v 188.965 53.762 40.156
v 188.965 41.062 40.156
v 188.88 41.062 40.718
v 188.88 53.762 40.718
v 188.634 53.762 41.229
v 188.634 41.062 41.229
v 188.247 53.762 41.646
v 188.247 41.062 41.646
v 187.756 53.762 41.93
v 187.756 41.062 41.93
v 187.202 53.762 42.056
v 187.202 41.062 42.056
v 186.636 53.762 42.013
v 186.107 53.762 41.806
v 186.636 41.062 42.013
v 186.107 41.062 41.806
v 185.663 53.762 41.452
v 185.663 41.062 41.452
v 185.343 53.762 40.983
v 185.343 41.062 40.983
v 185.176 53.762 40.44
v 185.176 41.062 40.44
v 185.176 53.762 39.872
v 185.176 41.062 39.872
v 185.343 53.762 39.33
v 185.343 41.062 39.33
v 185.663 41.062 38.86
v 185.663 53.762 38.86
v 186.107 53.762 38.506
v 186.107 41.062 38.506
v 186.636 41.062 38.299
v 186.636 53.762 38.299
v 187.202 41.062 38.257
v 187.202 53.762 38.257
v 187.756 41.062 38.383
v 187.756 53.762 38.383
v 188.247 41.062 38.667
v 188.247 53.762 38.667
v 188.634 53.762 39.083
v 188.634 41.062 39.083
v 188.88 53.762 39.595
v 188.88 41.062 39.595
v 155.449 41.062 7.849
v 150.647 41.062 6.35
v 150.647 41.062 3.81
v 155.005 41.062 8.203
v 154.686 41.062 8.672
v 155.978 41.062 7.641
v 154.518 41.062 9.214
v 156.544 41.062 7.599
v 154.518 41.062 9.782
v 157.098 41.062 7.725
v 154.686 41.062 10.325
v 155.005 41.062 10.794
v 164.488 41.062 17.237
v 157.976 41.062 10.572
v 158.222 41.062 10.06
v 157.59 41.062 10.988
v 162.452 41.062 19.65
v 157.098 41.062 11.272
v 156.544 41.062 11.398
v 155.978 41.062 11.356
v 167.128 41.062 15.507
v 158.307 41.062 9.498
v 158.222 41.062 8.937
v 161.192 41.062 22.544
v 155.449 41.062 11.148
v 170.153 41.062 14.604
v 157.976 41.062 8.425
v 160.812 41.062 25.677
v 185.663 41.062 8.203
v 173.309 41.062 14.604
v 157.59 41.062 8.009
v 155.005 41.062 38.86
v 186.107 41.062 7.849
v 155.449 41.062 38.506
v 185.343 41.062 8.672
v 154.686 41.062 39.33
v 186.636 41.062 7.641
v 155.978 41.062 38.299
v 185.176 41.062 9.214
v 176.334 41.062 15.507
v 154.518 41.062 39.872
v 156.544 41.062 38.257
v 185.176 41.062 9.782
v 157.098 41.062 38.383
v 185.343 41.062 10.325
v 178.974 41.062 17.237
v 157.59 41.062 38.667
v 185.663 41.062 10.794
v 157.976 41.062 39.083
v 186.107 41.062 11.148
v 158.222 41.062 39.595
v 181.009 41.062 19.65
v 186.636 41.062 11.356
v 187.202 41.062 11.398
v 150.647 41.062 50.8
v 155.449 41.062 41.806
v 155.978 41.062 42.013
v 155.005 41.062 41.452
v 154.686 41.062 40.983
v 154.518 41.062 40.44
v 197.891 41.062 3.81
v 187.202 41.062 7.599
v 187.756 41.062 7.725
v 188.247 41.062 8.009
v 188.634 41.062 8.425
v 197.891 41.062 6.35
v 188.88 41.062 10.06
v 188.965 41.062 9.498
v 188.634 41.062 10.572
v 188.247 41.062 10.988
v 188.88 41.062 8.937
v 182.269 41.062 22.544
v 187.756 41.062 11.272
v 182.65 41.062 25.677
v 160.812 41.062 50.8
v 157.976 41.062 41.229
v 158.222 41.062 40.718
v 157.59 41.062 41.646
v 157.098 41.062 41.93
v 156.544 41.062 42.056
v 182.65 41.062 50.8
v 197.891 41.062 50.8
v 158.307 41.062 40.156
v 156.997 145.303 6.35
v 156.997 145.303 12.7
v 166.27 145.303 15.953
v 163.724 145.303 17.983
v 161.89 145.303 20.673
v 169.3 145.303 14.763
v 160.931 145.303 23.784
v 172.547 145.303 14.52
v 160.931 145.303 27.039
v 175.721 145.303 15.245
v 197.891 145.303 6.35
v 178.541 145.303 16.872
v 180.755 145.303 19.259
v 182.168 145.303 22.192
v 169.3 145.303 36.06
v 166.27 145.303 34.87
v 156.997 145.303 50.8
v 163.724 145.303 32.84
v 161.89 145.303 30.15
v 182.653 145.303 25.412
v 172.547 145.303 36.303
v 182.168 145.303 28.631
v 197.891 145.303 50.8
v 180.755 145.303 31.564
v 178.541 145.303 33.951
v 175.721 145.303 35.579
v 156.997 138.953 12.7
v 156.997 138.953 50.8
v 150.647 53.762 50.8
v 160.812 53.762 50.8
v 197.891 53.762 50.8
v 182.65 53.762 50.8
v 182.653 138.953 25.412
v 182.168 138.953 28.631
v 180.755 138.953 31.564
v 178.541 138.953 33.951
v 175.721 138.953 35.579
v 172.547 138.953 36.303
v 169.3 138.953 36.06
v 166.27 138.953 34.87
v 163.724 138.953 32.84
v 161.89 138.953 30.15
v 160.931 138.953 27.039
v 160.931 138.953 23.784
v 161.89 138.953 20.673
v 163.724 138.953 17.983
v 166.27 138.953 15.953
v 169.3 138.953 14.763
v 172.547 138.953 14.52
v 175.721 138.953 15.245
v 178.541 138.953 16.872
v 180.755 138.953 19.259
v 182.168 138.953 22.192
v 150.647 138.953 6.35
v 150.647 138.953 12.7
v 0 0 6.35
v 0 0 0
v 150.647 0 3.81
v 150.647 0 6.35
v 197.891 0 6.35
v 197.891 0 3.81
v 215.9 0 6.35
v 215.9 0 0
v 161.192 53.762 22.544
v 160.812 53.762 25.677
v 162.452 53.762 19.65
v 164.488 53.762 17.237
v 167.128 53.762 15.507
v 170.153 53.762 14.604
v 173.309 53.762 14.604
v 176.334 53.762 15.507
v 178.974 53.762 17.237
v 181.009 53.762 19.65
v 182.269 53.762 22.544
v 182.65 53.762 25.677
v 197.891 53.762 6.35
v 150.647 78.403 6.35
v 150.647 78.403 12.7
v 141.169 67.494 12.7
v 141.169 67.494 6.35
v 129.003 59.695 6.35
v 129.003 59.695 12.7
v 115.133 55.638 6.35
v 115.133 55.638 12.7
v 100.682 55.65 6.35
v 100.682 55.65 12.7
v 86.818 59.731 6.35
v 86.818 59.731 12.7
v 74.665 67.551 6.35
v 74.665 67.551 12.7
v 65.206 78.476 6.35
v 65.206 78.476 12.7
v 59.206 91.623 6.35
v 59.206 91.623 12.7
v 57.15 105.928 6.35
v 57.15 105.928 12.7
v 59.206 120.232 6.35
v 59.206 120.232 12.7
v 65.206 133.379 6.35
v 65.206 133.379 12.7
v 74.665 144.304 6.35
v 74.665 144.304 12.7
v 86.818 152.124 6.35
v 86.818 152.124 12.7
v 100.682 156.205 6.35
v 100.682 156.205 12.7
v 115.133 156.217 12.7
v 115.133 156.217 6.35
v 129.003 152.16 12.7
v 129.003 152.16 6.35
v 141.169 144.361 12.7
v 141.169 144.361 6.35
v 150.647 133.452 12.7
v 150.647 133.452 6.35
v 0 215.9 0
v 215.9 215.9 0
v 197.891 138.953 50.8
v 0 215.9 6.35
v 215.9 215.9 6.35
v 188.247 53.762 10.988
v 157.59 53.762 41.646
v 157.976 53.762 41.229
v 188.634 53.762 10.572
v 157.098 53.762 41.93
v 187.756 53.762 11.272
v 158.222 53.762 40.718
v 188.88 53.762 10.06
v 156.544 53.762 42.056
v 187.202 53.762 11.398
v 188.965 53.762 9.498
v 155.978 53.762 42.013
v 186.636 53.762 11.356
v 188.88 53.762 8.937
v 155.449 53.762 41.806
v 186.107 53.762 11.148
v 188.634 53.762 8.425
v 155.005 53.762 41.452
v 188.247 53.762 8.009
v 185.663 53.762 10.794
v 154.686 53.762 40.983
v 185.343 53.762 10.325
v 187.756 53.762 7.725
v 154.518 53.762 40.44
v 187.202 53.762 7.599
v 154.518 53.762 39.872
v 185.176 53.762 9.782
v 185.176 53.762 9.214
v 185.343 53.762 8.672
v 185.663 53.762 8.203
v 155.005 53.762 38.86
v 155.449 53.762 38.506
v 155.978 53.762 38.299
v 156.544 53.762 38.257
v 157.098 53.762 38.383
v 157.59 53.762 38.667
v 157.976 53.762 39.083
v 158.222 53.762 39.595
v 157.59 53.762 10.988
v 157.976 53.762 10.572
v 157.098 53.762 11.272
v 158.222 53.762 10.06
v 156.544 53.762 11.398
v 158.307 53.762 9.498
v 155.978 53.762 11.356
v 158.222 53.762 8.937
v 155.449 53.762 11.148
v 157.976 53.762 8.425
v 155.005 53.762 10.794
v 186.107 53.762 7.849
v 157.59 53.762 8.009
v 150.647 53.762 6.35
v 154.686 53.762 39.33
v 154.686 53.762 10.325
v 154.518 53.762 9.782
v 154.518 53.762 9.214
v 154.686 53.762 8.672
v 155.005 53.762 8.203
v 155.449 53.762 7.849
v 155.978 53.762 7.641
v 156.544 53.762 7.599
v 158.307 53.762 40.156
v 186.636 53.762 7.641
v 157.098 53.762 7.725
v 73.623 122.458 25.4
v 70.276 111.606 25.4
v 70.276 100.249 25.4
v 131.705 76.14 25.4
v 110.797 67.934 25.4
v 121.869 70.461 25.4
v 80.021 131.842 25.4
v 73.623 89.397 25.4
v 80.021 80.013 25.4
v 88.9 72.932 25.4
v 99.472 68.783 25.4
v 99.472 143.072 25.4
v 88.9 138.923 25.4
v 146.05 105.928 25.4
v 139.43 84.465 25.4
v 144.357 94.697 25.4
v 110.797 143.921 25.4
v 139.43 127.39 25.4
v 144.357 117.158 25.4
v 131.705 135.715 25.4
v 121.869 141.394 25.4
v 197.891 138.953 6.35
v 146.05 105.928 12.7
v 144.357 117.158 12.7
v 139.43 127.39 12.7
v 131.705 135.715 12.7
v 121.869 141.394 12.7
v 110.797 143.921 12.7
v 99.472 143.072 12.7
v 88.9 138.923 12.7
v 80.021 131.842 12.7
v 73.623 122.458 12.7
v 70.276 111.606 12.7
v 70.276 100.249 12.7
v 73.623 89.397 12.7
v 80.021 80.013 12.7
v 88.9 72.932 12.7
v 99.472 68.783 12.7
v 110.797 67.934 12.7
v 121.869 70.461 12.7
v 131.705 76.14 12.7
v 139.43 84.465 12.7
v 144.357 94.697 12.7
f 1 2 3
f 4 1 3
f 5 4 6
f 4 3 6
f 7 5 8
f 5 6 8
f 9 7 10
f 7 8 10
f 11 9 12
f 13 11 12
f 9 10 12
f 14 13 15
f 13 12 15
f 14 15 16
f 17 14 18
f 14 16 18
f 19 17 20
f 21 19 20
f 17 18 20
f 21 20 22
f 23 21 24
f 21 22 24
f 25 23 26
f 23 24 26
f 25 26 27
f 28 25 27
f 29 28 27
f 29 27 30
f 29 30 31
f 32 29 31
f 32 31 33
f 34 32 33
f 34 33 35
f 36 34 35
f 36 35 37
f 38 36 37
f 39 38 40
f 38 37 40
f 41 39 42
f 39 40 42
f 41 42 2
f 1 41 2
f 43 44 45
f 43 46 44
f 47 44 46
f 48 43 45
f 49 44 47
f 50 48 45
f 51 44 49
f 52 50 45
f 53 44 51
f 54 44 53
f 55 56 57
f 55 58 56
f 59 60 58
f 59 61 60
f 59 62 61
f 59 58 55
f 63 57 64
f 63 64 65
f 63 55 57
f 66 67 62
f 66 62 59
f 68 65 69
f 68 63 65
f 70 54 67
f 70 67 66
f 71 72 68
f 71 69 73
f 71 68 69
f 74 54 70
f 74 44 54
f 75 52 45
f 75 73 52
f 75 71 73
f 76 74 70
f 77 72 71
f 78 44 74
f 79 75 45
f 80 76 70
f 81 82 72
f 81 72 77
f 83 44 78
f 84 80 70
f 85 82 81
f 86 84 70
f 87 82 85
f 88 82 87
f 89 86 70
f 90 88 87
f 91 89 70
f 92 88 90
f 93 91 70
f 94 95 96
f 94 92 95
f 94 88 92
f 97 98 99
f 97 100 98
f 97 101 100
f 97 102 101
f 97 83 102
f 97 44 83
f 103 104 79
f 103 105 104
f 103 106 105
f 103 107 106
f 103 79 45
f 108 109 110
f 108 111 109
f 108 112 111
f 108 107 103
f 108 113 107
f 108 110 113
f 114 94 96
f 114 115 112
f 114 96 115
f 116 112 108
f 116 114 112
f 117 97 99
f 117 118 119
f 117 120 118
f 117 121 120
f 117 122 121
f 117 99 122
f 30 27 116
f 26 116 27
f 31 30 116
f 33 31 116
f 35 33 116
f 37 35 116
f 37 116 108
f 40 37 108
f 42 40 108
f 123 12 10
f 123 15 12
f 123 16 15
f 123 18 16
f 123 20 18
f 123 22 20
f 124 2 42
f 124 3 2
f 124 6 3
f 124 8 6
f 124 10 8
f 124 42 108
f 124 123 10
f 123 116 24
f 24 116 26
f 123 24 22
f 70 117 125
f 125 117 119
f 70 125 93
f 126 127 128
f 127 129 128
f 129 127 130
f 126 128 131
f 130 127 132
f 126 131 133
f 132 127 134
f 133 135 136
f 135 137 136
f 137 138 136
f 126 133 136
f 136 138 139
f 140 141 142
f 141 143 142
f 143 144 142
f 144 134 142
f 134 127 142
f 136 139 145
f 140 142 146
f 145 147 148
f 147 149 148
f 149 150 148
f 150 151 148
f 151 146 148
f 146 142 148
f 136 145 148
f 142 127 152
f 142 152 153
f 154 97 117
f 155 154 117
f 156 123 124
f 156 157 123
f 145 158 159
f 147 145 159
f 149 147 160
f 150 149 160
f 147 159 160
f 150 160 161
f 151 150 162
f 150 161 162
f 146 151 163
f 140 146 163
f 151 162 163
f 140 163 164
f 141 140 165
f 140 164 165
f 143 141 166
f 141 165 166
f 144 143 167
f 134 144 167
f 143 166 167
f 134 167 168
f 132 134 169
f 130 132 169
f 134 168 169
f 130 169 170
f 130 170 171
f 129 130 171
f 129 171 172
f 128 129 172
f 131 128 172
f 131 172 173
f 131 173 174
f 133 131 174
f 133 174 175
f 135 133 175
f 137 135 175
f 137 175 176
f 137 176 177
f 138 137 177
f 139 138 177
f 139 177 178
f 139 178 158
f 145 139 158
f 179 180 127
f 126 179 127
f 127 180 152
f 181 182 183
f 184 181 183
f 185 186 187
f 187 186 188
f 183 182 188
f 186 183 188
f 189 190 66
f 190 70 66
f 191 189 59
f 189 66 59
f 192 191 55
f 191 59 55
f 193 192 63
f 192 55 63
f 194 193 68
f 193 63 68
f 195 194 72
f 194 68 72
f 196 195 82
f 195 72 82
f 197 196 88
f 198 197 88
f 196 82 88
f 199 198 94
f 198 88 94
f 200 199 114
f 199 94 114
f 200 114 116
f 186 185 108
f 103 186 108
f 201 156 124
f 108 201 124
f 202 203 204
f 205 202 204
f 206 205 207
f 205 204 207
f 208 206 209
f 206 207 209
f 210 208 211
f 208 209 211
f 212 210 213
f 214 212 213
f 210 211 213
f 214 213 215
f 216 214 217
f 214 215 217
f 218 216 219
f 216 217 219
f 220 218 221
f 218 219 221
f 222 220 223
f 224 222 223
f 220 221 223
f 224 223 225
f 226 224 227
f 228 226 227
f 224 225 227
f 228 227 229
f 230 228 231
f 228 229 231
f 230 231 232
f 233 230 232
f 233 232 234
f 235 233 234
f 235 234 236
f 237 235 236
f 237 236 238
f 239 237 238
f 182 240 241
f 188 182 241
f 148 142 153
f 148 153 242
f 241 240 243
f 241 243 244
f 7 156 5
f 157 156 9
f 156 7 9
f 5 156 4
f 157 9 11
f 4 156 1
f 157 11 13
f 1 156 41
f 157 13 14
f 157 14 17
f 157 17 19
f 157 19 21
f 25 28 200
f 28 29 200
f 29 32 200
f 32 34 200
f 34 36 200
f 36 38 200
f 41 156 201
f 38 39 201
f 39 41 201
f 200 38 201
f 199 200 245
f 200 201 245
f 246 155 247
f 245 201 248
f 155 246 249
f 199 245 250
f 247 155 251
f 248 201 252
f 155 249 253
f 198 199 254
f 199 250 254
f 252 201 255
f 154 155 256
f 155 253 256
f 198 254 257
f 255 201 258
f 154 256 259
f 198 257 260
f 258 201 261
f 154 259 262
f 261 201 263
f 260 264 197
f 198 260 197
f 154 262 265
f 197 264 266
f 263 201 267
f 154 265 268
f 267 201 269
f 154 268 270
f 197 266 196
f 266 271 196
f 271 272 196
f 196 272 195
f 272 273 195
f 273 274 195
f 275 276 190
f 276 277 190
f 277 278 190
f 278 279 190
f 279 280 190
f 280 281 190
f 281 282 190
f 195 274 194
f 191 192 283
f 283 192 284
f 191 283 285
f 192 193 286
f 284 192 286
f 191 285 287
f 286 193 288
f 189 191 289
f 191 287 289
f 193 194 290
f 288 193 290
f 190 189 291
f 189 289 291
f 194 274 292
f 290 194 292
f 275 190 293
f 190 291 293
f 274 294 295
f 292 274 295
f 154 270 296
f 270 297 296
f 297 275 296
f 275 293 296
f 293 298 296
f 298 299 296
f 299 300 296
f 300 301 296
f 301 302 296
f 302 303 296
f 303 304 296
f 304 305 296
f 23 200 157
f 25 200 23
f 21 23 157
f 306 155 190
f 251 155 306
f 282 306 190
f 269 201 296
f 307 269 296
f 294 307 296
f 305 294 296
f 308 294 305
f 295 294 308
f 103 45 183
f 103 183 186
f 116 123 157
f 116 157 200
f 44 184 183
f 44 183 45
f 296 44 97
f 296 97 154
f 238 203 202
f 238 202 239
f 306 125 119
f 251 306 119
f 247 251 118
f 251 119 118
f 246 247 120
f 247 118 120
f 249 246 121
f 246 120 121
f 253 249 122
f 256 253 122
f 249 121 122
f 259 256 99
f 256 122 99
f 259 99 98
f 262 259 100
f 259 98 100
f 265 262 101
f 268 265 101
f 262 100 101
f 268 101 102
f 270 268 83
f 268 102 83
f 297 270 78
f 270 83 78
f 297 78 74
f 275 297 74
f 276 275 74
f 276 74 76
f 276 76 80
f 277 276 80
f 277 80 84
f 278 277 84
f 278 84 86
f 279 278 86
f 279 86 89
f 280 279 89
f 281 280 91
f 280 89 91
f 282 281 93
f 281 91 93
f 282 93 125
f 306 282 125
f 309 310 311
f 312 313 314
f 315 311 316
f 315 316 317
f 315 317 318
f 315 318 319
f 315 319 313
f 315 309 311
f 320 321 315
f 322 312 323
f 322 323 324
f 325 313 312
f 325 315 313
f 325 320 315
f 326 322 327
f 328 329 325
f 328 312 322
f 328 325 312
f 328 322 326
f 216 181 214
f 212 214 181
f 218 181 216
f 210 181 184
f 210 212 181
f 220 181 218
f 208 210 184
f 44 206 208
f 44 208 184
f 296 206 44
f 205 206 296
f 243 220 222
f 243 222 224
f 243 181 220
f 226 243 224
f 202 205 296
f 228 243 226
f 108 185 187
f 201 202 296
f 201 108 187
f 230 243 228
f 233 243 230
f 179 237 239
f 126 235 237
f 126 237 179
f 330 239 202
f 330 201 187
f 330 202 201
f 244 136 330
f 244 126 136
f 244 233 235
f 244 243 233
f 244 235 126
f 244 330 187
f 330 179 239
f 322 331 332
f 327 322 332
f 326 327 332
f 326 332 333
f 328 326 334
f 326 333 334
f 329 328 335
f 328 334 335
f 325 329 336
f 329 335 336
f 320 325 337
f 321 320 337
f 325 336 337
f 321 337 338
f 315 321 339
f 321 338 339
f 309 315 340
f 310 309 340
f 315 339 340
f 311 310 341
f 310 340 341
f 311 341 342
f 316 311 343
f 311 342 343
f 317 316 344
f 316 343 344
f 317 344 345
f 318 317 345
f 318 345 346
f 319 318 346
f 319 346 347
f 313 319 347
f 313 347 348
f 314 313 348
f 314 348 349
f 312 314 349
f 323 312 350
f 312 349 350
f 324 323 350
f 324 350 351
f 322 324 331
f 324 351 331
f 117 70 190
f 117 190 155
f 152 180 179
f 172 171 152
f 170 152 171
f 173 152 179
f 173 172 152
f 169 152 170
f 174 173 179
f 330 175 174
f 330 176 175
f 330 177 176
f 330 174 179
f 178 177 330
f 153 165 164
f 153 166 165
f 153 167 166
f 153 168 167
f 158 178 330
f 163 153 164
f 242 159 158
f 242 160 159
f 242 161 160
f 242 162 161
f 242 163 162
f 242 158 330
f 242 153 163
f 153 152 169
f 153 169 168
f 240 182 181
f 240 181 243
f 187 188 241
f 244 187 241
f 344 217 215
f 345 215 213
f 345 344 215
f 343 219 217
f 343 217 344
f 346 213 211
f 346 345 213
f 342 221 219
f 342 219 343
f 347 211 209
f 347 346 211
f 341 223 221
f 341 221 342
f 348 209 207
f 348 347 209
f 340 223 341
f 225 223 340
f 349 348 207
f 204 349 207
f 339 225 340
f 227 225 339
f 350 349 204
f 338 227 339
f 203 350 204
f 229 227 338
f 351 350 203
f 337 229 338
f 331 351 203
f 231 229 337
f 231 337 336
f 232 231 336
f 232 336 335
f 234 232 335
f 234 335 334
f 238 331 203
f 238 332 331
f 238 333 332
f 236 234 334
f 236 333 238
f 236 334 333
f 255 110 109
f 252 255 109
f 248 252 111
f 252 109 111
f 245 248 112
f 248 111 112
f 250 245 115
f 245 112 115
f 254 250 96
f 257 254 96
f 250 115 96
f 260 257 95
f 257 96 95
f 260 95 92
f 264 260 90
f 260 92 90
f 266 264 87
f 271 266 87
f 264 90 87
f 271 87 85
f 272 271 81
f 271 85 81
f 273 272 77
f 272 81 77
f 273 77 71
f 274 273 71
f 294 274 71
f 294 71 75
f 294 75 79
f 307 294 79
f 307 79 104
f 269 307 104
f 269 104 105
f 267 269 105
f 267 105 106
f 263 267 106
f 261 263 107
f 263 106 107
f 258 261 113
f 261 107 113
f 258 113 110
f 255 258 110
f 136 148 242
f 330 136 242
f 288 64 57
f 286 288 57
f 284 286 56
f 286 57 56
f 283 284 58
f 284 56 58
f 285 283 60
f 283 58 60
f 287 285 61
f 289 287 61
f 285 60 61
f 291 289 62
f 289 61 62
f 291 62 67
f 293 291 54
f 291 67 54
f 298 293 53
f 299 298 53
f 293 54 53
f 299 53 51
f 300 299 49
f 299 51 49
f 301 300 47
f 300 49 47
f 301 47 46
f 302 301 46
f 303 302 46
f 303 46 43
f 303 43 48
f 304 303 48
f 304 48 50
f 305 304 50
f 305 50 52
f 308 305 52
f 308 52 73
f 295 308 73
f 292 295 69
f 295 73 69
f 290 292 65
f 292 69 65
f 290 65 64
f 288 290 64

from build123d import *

# Parameters (mm, degrees)
SKETCH1_W           = 215.9
SKETCH1_H           = 215.9
BOSS_EXTRUDE1_DEPTH = 12.7
BOSS_EXTRUDE2_DEPTH = 38.1
SKETCH4_W           = 47.244
SKETCH4_H           = 41.06164
CUT_EXTRUDE1_DEPTH  = 8.89
SKETCH6_W           = 47.244
SKETCH6_H           = 6.35
BOSS_EXTRUDE3_DEPTH = 38.1
SKETCH5_R           = 10.922
CUT_EXTRUDE2_DEPTH  = 175.83836
CUT_EXTRUDE4_DEPTH  = 38.1
SKETCH9_W           = 47.244
SKETCH9_H           = 85.1916
CUT_EXTRUDE5_DEPTH  = 6.35
SKETCH12_R          = 38.1
BOSS_EXTRUDE4_DEPTH = 12.7
SKETCH14_W          = 38.1
SKETCH14_H          = 6.35
CUT_EXTRUDE7_DEPTH  = 6.35
SKETCH10_R          = 1.905
CUT_EXTRUDE9_DEPTH  = 12.7
CUT_EXTRUDE10_DEPTH = 6.35


with BuildPart() as part:
    # Sketch1 → Boss-Extrude1 (new body)
    with BuildSketch(Plane.XY):
        with Locations((107.95, 107.95)):
            Rectangle(SKETCH1_W, SKETCH1_H)
    extrude(amount=BOSS_EXTRUDE1_DEPTH)

    # Sketch2 → Boss-Extrude2 (add)
    with BuildSketch(Plane.XY.offset(12.7)):
        Polygon((174.2694, 41.06164), (197.8914, 41.06164), (197.8914, 53.76164), (150.6474, 53.76164), (150.6474, 41.06164), align=None)
    extrude(amount=BOSS_EXTRUDE2_DEPTH)

    # Sketch4 → Cut-Extrude1 (cut)
    with BuildSketch(Plane.XY.offset(12.7)):
        with Locations((174.2694, 20.53082)):
            Rectangle(SKETCH4_W, SKETCH4_H)
    extrude(amount=-CUT_EXTRUDE1_DEPTH, mode=Mode.SUBTRACT)

    # Sketch6 → Boss-Extrude3 (add)
    with BuildSketch(Plane.XY.offset(12.7)):
        with Locations((174.2694, 142.12824)):
            Rectangle(SKETCH6_W, SKETCH6_H)
    extrude(amount=BOSS_EXTRUDE3_DEPTH)

    # Sketch5 → Cut-Extrude2 (cut, through all)
    with BuildSketch(Plane.XZ.offset(-41.06164)):
        with Locations((171.730776396, 25.411523701)):
            Circle(SKETCH5_R)
    extrude(amount=-CUT_EXTRUDE2_DEPTH, mode=Mode.SUBTRACT)

    # Sketch8 → Cut-Extrude4 (cut)
    with BuildSketch(Plane.XZ.offset(-41.06164)):
        with BuildLine():
            Line((160.812004434, 25.146), (160.812004434, 50.8))
            Line((160.812004434, 50.8), (182.649548358, 50.8))
            Line((182.649548358, 50.8), (182.649548358, 25.146))
            ThreePointArc((182.649548358, 25.146), (171.730776396, 36.064771962), (160.812004434, 25.146))
        make_face()
    extrude(amount=-CUT_EXTRUDE4_DEPTH, mode=Mode.SUBTRACT)

    # Sketch9 → Cut-Extrude5 (cut)
    with BuildSketch(Plane.XY.offset(12.7)):
        with Locations((174.2694, 96.35744)):
            Rectangle(SKETCH9_W, SKETCH9_H)
    extrude(amount=-CUT_EXTRUDE5_DEPTH, mode=Mode.SUBTRACT)

    # Sketch12 → Boss-Extrude4 (add)
    with BuildSketch(Plane.XY.offset(12.7)):
        with Locations((107.95, 105.927514247)):
            Circle(SKETCH12_R)
    extrude(amount=BOSS_EXTRUDE4_DEPTH)

    # Sketch14 → Cut-Extrude7 (cut)
    with BuildSketch(Plane.ZY.offset(-150.6474)):
        with Locations((31.75, 142.12824)):
            Rectangle(SKETCH14_W, SKETCH14_H)
    extrude(amount=-CUT_EXTRUDE7_DEPTH, mode=Mode.SUBTRACT)

    # Sketch10 → Cut-Extrude9 (cut)
    with BuildSketch(Plane.XZ.offset(-41.06164)):
        with Locations((187.059676396, 9.498423701)):
            Circle(SKETCH10_R)
        with Locations((156.401876396, 9.498423701)):
            Circle(SKETCH10_R)
        with Locations((156.401876396, 40.156223701)):
            Circle(SKETCH10_R)
        with Locations((187.059676396, 40.156223701)):
            Circle(SKETCH10_R)
    extrude(amount=-CUT_EXTRUDE9_DEPTH, mode=Mode.SUBTRACT)

    # Sketch15 → Cut-Extrude10 (cut)
    with BuildSketch(Plane.XY.offset(12.7)):
        with BuildLine():
            Line((197.8914, 145.30324), (197.8914, 0))
            Line((197.8914, 0), (215.9, 0))
            Line((215.9, 0), (215.9, 215.9))
            Line((215.9, 215.9), (0, 215.9))
            Line((0, 215.9), (0, 0))
            Line((0, 0), (150.6474, 0))
            Line((150.6474, 0), (150.6474, 78.403487774))
            ThreePointArc((150.6474, 78.403487774), (57.15, 105.927514247), (150.6474, 133.451540719))
            Line((150.6474, 133.451540719), (150.6474, 138.95324))
            Line((150.6474, 138.95324), (156.9974, 145.30324))
            Line((156.9974, 145.30324), (197.8914, 145.30324))
        make_face()
    extrude(amount=-CUT_EXTRUDE10_DEPTH, mode=Mode.SUBTRACT)


solid = part.part
